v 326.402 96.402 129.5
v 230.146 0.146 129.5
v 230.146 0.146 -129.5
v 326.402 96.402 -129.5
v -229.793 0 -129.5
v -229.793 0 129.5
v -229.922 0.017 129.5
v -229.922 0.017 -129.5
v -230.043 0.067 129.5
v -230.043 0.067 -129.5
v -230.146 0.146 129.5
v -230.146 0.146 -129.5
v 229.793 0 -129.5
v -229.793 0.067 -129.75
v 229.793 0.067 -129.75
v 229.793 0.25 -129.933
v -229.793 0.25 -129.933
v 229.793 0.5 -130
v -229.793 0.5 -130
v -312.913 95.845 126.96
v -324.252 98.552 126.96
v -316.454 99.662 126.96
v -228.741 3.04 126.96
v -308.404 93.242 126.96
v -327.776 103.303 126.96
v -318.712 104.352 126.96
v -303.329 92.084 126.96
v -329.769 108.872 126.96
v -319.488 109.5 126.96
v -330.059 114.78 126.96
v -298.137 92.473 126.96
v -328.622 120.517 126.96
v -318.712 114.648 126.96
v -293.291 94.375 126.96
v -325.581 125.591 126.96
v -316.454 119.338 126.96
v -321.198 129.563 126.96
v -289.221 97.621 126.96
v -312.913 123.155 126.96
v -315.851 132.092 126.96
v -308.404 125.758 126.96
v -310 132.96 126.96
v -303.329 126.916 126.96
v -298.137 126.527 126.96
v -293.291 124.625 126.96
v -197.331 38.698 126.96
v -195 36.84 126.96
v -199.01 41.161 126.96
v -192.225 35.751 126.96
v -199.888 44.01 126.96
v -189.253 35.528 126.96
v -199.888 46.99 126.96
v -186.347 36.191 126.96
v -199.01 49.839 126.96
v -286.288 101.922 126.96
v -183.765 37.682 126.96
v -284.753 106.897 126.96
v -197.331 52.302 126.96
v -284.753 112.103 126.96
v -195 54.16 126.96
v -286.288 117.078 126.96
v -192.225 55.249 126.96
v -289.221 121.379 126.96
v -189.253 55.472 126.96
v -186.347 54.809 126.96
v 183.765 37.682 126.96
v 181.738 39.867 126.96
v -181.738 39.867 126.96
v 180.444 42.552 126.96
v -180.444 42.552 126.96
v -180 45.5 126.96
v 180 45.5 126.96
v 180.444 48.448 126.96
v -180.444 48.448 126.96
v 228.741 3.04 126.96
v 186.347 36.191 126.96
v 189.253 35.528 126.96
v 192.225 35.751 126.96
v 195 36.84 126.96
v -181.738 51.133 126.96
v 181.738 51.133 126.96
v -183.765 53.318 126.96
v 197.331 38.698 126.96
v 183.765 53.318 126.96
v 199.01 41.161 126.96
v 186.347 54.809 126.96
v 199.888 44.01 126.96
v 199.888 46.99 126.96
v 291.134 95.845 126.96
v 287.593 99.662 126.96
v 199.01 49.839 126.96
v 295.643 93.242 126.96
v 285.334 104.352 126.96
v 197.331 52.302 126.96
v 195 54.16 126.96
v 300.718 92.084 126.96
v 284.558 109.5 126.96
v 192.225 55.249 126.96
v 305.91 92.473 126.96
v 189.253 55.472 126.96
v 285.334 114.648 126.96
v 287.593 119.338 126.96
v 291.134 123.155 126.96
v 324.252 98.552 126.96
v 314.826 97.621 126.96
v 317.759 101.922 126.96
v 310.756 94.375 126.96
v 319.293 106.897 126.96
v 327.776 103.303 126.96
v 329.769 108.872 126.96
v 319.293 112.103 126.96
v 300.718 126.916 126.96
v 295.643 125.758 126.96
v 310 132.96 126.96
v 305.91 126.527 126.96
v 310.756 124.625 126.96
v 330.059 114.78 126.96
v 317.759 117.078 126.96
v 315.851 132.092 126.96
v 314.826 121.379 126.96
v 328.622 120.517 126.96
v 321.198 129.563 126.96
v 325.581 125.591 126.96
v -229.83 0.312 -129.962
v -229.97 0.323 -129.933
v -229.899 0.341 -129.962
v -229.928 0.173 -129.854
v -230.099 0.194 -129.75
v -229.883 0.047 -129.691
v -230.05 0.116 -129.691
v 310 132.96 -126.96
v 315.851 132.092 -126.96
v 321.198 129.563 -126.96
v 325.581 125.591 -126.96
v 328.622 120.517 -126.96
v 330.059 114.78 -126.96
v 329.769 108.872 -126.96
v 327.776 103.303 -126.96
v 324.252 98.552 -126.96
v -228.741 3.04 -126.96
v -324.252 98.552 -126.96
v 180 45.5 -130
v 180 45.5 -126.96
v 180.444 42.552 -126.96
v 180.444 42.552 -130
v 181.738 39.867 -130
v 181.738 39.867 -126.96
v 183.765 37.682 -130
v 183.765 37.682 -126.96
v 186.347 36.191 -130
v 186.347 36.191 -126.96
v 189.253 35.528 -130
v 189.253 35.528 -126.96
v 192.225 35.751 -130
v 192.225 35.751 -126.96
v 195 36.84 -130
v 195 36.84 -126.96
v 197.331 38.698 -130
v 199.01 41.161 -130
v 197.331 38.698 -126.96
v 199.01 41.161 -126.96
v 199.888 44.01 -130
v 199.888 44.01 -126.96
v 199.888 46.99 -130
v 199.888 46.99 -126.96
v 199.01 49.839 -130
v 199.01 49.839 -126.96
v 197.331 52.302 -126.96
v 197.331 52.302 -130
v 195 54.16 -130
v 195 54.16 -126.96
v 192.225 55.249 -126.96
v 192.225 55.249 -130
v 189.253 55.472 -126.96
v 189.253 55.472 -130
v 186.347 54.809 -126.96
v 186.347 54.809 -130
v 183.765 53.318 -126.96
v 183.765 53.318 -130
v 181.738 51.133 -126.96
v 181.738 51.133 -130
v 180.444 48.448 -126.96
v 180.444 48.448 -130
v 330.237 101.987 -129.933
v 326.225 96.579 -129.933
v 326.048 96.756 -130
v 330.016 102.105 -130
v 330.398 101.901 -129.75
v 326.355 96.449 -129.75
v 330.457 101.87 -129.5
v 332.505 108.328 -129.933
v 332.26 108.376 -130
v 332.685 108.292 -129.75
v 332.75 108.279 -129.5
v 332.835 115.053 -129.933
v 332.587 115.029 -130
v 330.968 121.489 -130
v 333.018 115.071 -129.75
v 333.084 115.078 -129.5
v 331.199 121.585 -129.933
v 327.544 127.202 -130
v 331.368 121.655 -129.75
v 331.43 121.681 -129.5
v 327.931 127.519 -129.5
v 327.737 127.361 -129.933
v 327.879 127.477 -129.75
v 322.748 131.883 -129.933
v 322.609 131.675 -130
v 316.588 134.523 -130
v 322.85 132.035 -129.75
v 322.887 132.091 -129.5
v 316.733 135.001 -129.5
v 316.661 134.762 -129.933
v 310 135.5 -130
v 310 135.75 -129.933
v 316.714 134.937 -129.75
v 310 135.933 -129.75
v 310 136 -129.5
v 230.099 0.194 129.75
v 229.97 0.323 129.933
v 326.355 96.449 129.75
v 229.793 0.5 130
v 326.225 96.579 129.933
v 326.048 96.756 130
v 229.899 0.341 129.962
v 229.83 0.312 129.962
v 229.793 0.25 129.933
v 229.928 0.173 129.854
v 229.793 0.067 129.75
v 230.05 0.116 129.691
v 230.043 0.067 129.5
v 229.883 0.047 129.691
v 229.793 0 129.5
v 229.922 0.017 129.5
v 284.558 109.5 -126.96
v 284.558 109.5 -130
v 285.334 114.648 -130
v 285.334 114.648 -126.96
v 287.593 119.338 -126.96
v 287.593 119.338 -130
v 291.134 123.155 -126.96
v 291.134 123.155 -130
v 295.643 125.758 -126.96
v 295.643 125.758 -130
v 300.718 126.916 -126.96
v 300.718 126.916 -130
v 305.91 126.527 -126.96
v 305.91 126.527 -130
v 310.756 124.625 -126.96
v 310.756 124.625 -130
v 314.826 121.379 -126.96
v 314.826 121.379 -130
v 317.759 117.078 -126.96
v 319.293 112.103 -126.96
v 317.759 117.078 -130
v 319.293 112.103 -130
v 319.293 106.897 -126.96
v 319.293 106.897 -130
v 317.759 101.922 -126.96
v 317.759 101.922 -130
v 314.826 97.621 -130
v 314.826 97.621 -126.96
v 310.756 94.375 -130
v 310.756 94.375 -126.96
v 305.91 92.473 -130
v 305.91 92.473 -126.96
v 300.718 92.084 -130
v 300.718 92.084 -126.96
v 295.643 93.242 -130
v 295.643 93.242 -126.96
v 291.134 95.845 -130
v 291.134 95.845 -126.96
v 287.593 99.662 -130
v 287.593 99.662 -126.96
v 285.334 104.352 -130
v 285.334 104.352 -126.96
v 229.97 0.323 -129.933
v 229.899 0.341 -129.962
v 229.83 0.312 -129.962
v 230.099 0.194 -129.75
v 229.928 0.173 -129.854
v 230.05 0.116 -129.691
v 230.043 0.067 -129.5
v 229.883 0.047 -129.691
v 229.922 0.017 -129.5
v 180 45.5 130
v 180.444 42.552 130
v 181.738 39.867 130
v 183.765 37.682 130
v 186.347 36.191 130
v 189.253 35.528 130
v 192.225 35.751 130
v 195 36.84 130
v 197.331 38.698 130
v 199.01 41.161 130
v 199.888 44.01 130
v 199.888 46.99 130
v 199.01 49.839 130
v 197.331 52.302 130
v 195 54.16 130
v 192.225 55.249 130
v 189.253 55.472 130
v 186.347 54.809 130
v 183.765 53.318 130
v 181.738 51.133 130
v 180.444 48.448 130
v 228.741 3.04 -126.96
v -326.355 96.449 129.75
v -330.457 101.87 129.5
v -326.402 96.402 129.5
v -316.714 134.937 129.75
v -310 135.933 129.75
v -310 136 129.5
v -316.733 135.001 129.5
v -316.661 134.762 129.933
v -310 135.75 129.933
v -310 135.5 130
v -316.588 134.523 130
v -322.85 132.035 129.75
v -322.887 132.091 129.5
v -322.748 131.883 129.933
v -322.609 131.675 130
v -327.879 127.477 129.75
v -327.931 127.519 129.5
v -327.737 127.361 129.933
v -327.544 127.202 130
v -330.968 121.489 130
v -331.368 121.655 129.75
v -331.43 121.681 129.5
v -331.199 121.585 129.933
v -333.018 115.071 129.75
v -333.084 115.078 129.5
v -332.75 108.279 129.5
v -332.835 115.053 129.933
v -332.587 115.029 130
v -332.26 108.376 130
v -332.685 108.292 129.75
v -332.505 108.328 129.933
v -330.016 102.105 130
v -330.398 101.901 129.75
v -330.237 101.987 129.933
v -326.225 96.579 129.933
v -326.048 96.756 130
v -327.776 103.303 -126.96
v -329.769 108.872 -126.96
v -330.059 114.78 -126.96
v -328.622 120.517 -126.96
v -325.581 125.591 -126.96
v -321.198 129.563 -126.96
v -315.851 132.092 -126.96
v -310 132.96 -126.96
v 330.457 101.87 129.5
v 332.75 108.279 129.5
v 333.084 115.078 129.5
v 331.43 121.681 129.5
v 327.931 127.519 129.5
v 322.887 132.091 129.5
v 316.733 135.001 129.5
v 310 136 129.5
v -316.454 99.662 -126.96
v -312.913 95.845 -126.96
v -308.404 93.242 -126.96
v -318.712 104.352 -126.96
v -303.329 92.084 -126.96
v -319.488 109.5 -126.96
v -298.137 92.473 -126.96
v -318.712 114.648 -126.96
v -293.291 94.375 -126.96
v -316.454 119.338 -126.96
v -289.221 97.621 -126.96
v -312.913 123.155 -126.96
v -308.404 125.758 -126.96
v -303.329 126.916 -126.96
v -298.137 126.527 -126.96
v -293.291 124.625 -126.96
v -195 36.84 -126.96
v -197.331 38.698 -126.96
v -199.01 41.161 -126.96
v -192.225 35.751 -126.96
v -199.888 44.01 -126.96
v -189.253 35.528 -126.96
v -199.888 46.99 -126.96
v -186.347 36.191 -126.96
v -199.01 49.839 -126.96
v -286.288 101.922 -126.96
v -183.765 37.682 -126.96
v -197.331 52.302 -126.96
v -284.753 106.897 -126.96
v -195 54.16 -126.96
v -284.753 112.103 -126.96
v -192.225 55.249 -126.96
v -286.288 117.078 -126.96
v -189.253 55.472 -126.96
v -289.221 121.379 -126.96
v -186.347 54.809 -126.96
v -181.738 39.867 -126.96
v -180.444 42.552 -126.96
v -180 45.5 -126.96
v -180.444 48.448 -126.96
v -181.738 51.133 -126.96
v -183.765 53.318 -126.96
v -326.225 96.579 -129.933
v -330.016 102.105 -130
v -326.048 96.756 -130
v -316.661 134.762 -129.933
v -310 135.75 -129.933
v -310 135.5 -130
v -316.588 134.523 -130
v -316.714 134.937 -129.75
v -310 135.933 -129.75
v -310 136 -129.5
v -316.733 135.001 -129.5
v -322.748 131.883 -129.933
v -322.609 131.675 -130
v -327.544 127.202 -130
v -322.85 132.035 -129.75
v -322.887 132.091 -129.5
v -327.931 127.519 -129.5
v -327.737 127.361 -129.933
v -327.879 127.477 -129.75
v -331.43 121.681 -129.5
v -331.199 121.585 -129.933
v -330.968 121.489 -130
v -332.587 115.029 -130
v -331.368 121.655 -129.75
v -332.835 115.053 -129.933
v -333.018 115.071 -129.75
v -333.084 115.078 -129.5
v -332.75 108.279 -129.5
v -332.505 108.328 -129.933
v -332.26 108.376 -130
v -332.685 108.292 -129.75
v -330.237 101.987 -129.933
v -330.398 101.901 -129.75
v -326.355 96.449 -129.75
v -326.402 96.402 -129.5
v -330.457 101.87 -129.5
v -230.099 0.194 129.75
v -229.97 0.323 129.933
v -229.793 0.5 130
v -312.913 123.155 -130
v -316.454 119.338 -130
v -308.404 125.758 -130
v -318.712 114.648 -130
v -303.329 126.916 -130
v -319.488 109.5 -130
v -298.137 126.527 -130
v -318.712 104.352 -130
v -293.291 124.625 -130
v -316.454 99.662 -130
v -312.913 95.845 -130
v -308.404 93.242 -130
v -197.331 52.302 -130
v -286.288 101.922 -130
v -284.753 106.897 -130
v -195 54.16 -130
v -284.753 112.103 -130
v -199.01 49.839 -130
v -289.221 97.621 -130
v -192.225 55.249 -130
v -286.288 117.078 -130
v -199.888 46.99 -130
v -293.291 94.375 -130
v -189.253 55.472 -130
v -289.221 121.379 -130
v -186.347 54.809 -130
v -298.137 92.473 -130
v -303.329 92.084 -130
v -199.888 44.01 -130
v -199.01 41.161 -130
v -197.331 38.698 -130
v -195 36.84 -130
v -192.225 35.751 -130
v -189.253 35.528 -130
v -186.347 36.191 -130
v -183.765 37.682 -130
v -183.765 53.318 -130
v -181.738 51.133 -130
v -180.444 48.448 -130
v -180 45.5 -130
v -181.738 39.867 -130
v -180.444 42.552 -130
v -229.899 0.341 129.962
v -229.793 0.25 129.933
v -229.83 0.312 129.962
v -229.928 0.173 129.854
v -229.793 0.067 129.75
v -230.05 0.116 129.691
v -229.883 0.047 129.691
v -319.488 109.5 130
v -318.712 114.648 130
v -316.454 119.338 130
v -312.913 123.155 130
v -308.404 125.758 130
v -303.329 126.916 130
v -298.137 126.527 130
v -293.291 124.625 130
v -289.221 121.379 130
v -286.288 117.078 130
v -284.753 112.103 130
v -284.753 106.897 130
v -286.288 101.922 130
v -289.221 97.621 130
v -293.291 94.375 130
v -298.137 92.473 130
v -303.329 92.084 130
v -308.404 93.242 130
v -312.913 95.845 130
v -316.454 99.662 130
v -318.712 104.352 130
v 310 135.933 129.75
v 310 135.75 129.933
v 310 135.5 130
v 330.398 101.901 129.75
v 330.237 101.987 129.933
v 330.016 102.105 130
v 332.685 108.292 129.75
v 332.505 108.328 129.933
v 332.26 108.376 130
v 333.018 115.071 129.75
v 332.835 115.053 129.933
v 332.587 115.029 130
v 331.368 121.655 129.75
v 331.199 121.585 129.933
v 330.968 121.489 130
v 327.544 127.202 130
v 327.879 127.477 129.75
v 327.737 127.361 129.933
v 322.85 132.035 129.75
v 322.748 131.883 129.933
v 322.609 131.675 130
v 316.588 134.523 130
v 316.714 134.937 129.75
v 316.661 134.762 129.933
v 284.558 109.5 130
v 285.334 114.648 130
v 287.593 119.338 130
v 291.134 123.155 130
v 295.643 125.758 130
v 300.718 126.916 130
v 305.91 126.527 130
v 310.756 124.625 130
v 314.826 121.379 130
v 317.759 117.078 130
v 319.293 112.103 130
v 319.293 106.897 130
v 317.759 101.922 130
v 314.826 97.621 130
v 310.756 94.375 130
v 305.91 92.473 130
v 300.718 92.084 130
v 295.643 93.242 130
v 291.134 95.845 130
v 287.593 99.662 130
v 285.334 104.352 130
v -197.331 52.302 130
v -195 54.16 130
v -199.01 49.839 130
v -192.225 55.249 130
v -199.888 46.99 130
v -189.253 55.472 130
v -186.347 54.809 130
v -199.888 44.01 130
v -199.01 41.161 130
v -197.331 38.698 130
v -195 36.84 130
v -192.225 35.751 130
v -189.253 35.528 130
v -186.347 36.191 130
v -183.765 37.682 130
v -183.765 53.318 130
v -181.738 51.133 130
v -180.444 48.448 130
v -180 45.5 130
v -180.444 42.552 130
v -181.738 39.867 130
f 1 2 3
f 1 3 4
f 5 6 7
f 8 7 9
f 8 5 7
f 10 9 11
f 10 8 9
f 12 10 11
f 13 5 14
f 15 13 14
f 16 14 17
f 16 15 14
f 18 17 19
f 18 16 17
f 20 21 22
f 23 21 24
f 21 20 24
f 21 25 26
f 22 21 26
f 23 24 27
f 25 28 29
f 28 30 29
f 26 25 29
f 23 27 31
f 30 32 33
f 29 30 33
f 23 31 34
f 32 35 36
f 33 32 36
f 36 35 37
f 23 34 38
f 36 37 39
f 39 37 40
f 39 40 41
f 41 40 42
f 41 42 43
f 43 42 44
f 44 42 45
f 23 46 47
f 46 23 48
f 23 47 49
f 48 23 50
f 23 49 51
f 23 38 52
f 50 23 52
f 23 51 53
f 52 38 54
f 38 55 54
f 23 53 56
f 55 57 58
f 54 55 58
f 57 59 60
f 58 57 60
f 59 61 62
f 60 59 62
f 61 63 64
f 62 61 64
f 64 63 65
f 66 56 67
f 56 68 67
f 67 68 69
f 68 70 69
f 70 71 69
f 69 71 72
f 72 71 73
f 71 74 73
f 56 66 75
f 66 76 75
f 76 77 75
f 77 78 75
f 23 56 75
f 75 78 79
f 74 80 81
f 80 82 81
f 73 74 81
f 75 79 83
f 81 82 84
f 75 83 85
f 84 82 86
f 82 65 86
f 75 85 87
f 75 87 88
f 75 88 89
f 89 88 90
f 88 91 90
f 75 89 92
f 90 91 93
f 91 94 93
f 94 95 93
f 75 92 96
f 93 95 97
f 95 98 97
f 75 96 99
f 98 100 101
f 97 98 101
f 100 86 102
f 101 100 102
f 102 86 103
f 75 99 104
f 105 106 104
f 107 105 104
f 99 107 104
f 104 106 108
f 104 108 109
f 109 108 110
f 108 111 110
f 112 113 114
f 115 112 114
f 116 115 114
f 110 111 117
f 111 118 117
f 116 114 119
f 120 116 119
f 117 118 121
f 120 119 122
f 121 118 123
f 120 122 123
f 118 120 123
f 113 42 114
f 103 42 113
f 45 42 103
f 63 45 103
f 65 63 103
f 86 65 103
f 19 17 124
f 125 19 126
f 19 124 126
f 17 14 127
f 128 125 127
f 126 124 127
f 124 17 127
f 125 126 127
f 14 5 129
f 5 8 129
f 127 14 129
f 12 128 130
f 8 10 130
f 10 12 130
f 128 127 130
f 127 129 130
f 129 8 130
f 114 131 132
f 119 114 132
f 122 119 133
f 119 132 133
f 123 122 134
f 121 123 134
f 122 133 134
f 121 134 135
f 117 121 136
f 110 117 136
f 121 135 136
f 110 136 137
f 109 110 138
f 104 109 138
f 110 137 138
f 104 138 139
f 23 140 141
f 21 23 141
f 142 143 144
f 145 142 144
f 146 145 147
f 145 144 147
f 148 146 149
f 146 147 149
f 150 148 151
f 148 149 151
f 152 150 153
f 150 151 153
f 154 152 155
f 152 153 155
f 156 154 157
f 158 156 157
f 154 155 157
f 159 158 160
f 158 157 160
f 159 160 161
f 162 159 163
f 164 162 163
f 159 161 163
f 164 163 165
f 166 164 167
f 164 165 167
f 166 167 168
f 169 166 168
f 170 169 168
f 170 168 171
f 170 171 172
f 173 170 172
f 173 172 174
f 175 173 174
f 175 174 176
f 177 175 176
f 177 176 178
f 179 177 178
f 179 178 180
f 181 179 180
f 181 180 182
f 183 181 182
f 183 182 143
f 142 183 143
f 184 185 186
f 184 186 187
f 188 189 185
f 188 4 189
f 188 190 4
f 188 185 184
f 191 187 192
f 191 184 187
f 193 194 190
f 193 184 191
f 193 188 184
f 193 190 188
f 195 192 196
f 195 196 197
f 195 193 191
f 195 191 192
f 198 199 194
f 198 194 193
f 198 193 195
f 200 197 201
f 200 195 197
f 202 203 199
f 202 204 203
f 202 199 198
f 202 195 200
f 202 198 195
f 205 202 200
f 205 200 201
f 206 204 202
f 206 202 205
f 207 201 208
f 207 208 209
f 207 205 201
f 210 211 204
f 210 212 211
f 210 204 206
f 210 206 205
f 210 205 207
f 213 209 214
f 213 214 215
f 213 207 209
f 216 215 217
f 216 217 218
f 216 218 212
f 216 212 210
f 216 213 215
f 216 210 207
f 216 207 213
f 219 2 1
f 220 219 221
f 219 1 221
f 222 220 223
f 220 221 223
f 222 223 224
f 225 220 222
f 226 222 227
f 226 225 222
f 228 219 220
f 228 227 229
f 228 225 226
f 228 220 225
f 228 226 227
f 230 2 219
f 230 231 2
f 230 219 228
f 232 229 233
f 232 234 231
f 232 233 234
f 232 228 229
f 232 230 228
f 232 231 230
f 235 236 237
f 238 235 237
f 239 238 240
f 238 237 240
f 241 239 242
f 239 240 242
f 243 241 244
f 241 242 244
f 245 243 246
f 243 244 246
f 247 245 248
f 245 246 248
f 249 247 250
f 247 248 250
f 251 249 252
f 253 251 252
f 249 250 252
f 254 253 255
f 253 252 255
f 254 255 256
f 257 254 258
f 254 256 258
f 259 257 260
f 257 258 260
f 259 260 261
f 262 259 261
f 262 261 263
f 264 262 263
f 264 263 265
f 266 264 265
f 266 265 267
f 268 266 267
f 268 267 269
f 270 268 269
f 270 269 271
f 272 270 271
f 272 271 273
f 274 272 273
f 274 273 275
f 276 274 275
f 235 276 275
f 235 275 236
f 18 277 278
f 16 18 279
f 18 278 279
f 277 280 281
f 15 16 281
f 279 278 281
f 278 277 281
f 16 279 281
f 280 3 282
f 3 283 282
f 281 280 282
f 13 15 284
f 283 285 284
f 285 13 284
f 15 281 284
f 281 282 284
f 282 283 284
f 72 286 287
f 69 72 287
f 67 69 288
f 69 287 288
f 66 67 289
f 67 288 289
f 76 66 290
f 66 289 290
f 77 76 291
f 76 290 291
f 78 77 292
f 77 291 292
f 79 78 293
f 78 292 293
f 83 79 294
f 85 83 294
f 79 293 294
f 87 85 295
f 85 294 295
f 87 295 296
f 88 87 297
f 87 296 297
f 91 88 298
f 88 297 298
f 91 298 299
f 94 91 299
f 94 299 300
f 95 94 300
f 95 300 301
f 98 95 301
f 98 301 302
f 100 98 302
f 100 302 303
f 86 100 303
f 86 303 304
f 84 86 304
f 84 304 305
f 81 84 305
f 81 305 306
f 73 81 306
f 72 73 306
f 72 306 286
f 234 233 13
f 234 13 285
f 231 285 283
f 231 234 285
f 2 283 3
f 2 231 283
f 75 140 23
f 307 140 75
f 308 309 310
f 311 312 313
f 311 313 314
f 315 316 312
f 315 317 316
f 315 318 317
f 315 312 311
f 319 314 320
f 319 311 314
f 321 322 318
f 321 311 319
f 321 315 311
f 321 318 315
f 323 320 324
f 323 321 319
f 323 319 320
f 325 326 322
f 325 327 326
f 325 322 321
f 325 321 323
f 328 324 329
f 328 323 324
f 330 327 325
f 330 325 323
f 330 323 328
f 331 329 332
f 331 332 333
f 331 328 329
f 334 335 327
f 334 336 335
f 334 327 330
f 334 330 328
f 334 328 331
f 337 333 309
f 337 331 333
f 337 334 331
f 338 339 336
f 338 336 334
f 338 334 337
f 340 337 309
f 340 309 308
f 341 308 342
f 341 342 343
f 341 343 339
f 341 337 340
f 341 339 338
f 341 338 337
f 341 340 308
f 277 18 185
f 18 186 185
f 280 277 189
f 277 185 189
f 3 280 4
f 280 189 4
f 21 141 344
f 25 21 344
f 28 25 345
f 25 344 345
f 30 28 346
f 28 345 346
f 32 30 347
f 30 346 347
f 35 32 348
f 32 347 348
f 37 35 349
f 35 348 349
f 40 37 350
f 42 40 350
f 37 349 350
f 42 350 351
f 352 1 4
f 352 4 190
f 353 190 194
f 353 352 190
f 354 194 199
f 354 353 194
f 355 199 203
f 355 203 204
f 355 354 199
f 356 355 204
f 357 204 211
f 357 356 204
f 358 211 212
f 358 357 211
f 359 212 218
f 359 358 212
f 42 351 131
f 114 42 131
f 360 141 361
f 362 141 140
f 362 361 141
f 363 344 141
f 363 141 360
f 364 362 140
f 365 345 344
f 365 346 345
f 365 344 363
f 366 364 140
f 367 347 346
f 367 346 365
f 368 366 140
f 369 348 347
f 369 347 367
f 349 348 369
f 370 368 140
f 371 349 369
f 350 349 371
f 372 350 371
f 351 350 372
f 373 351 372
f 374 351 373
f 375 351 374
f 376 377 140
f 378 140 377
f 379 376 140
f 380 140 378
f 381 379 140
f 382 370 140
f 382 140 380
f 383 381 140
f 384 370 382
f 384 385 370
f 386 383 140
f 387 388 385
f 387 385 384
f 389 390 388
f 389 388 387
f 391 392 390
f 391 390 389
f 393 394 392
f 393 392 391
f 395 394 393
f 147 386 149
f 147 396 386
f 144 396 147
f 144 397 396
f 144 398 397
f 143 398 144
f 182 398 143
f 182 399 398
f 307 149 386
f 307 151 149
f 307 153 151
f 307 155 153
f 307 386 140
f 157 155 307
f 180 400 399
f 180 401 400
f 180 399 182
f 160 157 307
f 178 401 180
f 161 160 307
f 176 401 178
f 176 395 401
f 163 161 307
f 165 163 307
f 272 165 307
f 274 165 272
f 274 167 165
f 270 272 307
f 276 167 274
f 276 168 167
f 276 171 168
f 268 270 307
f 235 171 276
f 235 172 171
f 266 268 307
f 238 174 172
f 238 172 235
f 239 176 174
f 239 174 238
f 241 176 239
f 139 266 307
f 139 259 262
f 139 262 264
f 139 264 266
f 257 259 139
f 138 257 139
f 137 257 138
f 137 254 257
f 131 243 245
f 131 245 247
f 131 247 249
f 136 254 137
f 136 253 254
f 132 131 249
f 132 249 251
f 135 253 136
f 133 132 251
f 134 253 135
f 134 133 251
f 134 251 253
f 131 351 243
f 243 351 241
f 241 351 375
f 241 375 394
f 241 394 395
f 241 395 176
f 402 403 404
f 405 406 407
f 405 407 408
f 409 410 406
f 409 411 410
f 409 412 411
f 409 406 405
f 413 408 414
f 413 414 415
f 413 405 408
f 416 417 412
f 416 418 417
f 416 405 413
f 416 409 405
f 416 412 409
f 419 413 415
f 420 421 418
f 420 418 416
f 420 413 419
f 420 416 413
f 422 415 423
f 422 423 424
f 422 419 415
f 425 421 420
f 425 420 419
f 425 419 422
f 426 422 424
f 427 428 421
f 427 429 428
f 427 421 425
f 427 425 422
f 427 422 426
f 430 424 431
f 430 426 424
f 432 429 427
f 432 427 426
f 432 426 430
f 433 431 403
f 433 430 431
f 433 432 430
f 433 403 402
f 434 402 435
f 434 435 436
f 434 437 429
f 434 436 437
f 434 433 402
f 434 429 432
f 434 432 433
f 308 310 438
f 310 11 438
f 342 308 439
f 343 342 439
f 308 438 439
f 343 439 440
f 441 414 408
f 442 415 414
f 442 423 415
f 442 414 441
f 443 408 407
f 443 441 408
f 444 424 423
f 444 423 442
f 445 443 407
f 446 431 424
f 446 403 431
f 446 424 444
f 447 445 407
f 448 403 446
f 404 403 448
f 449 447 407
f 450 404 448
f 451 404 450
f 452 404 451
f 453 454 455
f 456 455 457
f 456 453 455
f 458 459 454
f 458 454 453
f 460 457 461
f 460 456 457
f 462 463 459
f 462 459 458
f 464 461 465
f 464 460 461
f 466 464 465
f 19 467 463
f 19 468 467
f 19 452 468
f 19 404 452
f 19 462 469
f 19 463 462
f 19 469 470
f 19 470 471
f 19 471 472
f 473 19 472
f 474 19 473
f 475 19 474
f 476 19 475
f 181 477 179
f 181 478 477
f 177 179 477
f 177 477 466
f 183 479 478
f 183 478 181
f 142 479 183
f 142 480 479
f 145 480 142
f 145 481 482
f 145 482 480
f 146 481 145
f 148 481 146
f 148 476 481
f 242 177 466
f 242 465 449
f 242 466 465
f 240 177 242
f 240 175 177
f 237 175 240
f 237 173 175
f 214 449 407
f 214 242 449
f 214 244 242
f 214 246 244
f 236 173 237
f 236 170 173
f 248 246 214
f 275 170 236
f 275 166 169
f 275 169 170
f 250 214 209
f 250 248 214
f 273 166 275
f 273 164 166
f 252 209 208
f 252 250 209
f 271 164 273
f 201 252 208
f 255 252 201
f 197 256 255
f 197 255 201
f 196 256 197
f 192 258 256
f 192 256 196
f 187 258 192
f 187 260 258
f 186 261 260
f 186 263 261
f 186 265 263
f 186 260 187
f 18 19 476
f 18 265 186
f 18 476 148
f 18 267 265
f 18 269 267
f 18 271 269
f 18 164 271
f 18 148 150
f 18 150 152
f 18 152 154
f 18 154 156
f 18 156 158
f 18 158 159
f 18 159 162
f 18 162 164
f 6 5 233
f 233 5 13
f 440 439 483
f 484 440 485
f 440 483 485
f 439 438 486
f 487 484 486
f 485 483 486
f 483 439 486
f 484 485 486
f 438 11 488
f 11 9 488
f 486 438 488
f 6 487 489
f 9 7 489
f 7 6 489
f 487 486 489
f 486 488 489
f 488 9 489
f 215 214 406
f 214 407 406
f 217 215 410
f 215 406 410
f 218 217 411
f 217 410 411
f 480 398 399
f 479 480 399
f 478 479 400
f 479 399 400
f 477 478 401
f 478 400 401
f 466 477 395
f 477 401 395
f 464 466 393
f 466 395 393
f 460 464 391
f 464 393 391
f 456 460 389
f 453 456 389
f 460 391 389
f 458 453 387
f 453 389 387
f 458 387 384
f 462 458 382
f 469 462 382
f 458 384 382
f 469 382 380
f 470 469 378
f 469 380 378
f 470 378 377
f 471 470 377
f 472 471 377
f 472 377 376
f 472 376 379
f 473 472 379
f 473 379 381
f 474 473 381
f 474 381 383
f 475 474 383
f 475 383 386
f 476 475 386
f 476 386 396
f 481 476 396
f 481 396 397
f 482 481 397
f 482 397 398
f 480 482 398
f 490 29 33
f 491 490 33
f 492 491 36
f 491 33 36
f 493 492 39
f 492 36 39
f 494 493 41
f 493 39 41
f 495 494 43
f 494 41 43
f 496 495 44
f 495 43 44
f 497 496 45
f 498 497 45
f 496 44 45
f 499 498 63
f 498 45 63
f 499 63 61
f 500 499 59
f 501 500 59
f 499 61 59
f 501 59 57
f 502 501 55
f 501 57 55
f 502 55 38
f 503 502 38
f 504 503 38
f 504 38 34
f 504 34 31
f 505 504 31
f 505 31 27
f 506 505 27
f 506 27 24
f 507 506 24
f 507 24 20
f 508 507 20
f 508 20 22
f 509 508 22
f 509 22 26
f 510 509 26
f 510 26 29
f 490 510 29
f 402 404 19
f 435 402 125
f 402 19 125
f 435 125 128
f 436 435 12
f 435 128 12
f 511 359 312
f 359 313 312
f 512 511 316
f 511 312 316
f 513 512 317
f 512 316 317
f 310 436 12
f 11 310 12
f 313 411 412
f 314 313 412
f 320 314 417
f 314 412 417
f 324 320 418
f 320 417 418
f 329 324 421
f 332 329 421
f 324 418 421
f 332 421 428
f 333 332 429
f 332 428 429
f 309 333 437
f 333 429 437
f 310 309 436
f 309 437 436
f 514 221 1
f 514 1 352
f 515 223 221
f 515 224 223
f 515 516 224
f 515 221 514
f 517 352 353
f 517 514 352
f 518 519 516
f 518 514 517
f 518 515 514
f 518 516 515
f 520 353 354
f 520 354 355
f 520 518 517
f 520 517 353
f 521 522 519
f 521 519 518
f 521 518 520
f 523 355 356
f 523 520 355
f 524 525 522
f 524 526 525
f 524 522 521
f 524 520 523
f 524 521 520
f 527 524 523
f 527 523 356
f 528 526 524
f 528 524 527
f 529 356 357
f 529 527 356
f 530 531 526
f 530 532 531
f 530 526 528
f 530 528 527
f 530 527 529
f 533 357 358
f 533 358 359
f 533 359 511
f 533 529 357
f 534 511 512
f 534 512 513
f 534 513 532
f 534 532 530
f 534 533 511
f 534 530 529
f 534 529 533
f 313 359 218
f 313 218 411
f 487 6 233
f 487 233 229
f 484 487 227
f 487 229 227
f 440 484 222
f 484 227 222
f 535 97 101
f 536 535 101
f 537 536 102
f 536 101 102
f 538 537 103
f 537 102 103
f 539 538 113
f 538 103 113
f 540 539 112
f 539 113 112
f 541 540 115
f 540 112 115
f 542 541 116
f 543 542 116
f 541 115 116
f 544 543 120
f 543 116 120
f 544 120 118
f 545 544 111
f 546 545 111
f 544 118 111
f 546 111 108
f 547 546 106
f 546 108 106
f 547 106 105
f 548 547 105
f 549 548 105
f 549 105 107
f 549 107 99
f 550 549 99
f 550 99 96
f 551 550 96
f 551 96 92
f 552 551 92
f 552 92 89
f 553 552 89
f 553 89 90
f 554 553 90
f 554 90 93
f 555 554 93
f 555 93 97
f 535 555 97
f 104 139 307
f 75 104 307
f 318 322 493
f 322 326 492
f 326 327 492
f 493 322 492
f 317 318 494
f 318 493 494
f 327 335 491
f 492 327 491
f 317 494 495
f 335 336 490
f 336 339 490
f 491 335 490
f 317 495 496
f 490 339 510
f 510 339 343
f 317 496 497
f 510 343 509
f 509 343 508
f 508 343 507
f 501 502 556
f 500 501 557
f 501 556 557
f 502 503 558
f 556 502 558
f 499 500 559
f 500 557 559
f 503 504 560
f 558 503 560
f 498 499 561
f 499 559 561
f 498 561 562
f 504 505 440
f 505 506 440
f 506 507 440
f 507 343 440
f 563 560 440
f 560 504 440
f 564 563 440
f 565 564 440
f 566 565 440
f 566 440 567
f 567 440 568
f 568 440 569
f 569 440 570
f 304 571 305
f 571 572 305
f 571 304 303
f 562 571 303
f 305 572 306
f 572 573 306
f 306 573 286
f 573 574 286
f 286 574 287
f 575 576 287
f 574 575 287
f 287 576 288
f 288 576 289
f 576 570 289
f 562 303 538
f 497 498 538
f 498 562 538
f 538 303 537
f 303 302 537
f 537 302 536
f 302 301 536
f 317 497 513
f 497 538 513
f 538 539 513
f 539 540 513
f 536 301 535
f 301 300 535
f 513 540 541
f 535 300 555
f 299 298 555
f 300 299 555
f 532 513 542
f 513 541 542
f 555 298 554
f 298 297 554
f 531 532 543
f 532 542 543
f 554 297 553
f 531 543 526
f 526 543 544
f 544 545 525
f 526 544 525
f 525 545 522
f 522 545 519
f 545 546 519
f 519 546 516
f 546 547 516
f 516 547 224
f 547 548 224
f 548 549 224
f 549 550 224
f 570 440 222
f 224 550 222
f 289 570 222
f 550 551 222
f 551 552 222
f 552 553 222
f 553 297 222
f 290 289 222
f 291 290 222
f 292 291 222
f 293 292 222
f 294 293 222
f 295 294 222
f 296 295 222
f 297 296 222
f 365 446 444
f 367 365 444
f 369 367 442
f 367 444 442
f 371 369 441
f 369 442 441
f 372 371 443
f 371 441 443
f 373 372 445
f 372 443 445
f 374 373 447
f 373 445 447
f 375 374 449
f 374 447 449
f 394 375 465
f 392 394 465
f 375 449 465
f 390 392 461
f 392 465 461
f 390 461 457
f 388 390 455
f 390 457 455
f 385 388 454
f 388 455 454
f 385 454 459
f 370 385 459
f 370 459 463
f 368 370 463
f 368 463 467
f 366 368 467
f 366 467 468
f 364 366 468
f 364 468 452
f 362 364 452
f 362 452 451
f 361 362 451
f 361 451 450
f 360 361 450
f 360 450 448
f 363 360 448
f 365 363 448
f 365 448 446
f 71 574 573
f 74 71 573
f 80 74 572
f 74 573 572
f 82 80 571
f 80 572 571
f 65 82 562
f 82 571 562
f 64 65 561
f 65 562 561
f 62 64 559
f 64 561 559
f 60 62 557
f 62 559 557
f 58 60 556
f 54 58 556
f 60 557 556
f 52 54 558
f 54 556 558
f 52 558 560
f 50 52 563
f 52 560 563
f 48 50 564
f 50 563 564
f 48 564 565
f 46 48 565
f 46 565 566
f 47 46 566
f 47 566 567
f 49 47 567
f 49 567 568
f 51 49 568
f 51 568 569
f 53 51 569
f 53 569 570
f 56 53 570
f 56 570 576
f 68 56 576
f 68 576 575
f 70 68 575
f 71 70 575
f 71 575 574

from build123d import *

# Parameters (mm, degrees)
SKETCH1_W           = 460
SKETCH1_H           = 260
BOSS_EXTRUDE1_DEPTH = 3.04
BOSS_EXTRUDE2_DEPTH = 3.04
BOSS_EXTRUDE4_DEPTH = 260
FILLET1_R           = 0.5
SKETCH6_R           = 17.465
CUT_EXTRUDE1_DEPTH  = 444.976967296
SKETCH8_R           = 10
CUT_EXTRUDE2_DEPTH  = 444.976967296


with BuildPart() as part:
    # Sketch1 → Boss-Extrude1 (new body)
    with BuildSketch(Plane(origin=(0, 0, 0), x_dir=(1, 0, 0), z_dir=(0, 1, 0))):
        Rectangle(SKETCH1_W, SKETCH1_H)
    extrude(amount=BOSS_EXTRUDE1_DEPTH)

    # Sketch2 → Boss-Extrude2 (add)
    with BuildSketch(Plane.XY.offset(130)):
        with BuildLine():
            Line((-230, 0), (230, 0))
            Line((230, 0), (326.402020254, 96.402020254))
            ThreePointArc((326.402020254, 96.402020254), (331.430272212, 121.680749903), (310, 136))
            Line((310, 136), (-310, 136))
            ThreePointArc((-310, 136), (-331.430272212, 121.680749903), (-326.402020254, 96.402020254))
            Line((-326.402020254, 96.402020254), (-230, 0))
        make_face()
    boss_extrude2 = extrude(amount=-BOSS_EXTRUDE2_DEPTH)

    # Mirror1: Boss-Extrude2 across plane
    add(boss_extrude2.mirror(Plane.XY))

    # Sketch4 → Boss-Extrude4 (add)
    with BuildSketch(Plane(origin=(0, 0, -130), x_dir=(-1, 0, 0), z_dir=(0, 0, -1))):
        with BuildLine():
            Line((-326.402020254, 96.402020254), (-230, 0))
            Line((-230, 0), (230, 0))
            Line((230, 0), (326.402020254, 96.402020254))
            ThreePointArc((326.402020254, 96.402020254), (331.430272212, 121.680749903), (310, 136))
            Line((310, 136), (-310, 136))
            ThreePointArc((-310, 136), (-331.430272212, 121.680749903), (-326.402020254, 96.402020254))
        make_face()
        with BuildLine():
            Line((-324.252415639, 98.551624868), (-228.74079077, 3.04))
            Line((-228.74079077, 3.04), (228.74079077, 3.04))
            Line((228.74079077, 3.04), (324.252415639, 98.551624868))
            ThreePointArc((324.252415639, 98.551624868), (328.621678434, 120.517392268), (310, 132.96))
            Line((310, 132.96), (-310, 132.96))
            ThreePointArc((-310, 132.96), (-328.621678434, 120.517392268), (-324.252415639, 98.551624868))
        make_face(mode=Mode.SUBTRACT)
    extrude(amount=-BOSS_EXTRUDE4_DEPTH)

    # Fillet1
    fillet1_edges = [part.edges().sort_by_distance(p)[0] for p in [
        (278.201010127, 48.201010127, 130),
        (331.430272212, 121.680749903, 130),
        (0, 136, 130),
        (-331.430272212, 121.680749903, 130),
        (-278.201010127, 48.201010127, 130),
        (-278.201010127, 48.201010127, -130),
        (278.201010127, 48.201010127, -130),
        (331.430272212, 121.680749903, -130),
        (0, 136, -130),
        (-331.430272212, 121.680749903, -130),
        (0, 0, 130),
        (-230, 0, 0),
        (0, 0, -130),
        (230, 0, 0),
    ]]
    fillet(fillet1_edges, radius=FILLET1_R)

    # Sketch6 → Cut-Extrude1 (cut, through all)
    with BuildSketch(Plane(origin=(0, 0, -130), x_dir=(-1, 0, 0), z_dir=(0, 0, -1))):
        with Locations((-302.023340597, 109.5)):
            Circle(SKETCH6_R)
        with Locations((302.023340597, 109.5)):
            Circle(SKETCH6_R)
    extrude(amount=-CUT_EXTRUDE1_DEPTH, mode=Mode.SUBTRACT)

    # Sketch8 → Cut-Extrude2 (cut, through all)
    with BuildSketch(Plane.XY.offset(130)):
        with Locations((-190, 45.5)):
            Circle(SKETCH8_R)
        with Locations(Location((190, 45.5, 0), (0, 0, 180))):
            Circle(SKETCH8_R)
    extrude(amount=-CUT_EXTRUDE2_DEPTH, mode=Mode.SUBTRACT)


solid = part.part
